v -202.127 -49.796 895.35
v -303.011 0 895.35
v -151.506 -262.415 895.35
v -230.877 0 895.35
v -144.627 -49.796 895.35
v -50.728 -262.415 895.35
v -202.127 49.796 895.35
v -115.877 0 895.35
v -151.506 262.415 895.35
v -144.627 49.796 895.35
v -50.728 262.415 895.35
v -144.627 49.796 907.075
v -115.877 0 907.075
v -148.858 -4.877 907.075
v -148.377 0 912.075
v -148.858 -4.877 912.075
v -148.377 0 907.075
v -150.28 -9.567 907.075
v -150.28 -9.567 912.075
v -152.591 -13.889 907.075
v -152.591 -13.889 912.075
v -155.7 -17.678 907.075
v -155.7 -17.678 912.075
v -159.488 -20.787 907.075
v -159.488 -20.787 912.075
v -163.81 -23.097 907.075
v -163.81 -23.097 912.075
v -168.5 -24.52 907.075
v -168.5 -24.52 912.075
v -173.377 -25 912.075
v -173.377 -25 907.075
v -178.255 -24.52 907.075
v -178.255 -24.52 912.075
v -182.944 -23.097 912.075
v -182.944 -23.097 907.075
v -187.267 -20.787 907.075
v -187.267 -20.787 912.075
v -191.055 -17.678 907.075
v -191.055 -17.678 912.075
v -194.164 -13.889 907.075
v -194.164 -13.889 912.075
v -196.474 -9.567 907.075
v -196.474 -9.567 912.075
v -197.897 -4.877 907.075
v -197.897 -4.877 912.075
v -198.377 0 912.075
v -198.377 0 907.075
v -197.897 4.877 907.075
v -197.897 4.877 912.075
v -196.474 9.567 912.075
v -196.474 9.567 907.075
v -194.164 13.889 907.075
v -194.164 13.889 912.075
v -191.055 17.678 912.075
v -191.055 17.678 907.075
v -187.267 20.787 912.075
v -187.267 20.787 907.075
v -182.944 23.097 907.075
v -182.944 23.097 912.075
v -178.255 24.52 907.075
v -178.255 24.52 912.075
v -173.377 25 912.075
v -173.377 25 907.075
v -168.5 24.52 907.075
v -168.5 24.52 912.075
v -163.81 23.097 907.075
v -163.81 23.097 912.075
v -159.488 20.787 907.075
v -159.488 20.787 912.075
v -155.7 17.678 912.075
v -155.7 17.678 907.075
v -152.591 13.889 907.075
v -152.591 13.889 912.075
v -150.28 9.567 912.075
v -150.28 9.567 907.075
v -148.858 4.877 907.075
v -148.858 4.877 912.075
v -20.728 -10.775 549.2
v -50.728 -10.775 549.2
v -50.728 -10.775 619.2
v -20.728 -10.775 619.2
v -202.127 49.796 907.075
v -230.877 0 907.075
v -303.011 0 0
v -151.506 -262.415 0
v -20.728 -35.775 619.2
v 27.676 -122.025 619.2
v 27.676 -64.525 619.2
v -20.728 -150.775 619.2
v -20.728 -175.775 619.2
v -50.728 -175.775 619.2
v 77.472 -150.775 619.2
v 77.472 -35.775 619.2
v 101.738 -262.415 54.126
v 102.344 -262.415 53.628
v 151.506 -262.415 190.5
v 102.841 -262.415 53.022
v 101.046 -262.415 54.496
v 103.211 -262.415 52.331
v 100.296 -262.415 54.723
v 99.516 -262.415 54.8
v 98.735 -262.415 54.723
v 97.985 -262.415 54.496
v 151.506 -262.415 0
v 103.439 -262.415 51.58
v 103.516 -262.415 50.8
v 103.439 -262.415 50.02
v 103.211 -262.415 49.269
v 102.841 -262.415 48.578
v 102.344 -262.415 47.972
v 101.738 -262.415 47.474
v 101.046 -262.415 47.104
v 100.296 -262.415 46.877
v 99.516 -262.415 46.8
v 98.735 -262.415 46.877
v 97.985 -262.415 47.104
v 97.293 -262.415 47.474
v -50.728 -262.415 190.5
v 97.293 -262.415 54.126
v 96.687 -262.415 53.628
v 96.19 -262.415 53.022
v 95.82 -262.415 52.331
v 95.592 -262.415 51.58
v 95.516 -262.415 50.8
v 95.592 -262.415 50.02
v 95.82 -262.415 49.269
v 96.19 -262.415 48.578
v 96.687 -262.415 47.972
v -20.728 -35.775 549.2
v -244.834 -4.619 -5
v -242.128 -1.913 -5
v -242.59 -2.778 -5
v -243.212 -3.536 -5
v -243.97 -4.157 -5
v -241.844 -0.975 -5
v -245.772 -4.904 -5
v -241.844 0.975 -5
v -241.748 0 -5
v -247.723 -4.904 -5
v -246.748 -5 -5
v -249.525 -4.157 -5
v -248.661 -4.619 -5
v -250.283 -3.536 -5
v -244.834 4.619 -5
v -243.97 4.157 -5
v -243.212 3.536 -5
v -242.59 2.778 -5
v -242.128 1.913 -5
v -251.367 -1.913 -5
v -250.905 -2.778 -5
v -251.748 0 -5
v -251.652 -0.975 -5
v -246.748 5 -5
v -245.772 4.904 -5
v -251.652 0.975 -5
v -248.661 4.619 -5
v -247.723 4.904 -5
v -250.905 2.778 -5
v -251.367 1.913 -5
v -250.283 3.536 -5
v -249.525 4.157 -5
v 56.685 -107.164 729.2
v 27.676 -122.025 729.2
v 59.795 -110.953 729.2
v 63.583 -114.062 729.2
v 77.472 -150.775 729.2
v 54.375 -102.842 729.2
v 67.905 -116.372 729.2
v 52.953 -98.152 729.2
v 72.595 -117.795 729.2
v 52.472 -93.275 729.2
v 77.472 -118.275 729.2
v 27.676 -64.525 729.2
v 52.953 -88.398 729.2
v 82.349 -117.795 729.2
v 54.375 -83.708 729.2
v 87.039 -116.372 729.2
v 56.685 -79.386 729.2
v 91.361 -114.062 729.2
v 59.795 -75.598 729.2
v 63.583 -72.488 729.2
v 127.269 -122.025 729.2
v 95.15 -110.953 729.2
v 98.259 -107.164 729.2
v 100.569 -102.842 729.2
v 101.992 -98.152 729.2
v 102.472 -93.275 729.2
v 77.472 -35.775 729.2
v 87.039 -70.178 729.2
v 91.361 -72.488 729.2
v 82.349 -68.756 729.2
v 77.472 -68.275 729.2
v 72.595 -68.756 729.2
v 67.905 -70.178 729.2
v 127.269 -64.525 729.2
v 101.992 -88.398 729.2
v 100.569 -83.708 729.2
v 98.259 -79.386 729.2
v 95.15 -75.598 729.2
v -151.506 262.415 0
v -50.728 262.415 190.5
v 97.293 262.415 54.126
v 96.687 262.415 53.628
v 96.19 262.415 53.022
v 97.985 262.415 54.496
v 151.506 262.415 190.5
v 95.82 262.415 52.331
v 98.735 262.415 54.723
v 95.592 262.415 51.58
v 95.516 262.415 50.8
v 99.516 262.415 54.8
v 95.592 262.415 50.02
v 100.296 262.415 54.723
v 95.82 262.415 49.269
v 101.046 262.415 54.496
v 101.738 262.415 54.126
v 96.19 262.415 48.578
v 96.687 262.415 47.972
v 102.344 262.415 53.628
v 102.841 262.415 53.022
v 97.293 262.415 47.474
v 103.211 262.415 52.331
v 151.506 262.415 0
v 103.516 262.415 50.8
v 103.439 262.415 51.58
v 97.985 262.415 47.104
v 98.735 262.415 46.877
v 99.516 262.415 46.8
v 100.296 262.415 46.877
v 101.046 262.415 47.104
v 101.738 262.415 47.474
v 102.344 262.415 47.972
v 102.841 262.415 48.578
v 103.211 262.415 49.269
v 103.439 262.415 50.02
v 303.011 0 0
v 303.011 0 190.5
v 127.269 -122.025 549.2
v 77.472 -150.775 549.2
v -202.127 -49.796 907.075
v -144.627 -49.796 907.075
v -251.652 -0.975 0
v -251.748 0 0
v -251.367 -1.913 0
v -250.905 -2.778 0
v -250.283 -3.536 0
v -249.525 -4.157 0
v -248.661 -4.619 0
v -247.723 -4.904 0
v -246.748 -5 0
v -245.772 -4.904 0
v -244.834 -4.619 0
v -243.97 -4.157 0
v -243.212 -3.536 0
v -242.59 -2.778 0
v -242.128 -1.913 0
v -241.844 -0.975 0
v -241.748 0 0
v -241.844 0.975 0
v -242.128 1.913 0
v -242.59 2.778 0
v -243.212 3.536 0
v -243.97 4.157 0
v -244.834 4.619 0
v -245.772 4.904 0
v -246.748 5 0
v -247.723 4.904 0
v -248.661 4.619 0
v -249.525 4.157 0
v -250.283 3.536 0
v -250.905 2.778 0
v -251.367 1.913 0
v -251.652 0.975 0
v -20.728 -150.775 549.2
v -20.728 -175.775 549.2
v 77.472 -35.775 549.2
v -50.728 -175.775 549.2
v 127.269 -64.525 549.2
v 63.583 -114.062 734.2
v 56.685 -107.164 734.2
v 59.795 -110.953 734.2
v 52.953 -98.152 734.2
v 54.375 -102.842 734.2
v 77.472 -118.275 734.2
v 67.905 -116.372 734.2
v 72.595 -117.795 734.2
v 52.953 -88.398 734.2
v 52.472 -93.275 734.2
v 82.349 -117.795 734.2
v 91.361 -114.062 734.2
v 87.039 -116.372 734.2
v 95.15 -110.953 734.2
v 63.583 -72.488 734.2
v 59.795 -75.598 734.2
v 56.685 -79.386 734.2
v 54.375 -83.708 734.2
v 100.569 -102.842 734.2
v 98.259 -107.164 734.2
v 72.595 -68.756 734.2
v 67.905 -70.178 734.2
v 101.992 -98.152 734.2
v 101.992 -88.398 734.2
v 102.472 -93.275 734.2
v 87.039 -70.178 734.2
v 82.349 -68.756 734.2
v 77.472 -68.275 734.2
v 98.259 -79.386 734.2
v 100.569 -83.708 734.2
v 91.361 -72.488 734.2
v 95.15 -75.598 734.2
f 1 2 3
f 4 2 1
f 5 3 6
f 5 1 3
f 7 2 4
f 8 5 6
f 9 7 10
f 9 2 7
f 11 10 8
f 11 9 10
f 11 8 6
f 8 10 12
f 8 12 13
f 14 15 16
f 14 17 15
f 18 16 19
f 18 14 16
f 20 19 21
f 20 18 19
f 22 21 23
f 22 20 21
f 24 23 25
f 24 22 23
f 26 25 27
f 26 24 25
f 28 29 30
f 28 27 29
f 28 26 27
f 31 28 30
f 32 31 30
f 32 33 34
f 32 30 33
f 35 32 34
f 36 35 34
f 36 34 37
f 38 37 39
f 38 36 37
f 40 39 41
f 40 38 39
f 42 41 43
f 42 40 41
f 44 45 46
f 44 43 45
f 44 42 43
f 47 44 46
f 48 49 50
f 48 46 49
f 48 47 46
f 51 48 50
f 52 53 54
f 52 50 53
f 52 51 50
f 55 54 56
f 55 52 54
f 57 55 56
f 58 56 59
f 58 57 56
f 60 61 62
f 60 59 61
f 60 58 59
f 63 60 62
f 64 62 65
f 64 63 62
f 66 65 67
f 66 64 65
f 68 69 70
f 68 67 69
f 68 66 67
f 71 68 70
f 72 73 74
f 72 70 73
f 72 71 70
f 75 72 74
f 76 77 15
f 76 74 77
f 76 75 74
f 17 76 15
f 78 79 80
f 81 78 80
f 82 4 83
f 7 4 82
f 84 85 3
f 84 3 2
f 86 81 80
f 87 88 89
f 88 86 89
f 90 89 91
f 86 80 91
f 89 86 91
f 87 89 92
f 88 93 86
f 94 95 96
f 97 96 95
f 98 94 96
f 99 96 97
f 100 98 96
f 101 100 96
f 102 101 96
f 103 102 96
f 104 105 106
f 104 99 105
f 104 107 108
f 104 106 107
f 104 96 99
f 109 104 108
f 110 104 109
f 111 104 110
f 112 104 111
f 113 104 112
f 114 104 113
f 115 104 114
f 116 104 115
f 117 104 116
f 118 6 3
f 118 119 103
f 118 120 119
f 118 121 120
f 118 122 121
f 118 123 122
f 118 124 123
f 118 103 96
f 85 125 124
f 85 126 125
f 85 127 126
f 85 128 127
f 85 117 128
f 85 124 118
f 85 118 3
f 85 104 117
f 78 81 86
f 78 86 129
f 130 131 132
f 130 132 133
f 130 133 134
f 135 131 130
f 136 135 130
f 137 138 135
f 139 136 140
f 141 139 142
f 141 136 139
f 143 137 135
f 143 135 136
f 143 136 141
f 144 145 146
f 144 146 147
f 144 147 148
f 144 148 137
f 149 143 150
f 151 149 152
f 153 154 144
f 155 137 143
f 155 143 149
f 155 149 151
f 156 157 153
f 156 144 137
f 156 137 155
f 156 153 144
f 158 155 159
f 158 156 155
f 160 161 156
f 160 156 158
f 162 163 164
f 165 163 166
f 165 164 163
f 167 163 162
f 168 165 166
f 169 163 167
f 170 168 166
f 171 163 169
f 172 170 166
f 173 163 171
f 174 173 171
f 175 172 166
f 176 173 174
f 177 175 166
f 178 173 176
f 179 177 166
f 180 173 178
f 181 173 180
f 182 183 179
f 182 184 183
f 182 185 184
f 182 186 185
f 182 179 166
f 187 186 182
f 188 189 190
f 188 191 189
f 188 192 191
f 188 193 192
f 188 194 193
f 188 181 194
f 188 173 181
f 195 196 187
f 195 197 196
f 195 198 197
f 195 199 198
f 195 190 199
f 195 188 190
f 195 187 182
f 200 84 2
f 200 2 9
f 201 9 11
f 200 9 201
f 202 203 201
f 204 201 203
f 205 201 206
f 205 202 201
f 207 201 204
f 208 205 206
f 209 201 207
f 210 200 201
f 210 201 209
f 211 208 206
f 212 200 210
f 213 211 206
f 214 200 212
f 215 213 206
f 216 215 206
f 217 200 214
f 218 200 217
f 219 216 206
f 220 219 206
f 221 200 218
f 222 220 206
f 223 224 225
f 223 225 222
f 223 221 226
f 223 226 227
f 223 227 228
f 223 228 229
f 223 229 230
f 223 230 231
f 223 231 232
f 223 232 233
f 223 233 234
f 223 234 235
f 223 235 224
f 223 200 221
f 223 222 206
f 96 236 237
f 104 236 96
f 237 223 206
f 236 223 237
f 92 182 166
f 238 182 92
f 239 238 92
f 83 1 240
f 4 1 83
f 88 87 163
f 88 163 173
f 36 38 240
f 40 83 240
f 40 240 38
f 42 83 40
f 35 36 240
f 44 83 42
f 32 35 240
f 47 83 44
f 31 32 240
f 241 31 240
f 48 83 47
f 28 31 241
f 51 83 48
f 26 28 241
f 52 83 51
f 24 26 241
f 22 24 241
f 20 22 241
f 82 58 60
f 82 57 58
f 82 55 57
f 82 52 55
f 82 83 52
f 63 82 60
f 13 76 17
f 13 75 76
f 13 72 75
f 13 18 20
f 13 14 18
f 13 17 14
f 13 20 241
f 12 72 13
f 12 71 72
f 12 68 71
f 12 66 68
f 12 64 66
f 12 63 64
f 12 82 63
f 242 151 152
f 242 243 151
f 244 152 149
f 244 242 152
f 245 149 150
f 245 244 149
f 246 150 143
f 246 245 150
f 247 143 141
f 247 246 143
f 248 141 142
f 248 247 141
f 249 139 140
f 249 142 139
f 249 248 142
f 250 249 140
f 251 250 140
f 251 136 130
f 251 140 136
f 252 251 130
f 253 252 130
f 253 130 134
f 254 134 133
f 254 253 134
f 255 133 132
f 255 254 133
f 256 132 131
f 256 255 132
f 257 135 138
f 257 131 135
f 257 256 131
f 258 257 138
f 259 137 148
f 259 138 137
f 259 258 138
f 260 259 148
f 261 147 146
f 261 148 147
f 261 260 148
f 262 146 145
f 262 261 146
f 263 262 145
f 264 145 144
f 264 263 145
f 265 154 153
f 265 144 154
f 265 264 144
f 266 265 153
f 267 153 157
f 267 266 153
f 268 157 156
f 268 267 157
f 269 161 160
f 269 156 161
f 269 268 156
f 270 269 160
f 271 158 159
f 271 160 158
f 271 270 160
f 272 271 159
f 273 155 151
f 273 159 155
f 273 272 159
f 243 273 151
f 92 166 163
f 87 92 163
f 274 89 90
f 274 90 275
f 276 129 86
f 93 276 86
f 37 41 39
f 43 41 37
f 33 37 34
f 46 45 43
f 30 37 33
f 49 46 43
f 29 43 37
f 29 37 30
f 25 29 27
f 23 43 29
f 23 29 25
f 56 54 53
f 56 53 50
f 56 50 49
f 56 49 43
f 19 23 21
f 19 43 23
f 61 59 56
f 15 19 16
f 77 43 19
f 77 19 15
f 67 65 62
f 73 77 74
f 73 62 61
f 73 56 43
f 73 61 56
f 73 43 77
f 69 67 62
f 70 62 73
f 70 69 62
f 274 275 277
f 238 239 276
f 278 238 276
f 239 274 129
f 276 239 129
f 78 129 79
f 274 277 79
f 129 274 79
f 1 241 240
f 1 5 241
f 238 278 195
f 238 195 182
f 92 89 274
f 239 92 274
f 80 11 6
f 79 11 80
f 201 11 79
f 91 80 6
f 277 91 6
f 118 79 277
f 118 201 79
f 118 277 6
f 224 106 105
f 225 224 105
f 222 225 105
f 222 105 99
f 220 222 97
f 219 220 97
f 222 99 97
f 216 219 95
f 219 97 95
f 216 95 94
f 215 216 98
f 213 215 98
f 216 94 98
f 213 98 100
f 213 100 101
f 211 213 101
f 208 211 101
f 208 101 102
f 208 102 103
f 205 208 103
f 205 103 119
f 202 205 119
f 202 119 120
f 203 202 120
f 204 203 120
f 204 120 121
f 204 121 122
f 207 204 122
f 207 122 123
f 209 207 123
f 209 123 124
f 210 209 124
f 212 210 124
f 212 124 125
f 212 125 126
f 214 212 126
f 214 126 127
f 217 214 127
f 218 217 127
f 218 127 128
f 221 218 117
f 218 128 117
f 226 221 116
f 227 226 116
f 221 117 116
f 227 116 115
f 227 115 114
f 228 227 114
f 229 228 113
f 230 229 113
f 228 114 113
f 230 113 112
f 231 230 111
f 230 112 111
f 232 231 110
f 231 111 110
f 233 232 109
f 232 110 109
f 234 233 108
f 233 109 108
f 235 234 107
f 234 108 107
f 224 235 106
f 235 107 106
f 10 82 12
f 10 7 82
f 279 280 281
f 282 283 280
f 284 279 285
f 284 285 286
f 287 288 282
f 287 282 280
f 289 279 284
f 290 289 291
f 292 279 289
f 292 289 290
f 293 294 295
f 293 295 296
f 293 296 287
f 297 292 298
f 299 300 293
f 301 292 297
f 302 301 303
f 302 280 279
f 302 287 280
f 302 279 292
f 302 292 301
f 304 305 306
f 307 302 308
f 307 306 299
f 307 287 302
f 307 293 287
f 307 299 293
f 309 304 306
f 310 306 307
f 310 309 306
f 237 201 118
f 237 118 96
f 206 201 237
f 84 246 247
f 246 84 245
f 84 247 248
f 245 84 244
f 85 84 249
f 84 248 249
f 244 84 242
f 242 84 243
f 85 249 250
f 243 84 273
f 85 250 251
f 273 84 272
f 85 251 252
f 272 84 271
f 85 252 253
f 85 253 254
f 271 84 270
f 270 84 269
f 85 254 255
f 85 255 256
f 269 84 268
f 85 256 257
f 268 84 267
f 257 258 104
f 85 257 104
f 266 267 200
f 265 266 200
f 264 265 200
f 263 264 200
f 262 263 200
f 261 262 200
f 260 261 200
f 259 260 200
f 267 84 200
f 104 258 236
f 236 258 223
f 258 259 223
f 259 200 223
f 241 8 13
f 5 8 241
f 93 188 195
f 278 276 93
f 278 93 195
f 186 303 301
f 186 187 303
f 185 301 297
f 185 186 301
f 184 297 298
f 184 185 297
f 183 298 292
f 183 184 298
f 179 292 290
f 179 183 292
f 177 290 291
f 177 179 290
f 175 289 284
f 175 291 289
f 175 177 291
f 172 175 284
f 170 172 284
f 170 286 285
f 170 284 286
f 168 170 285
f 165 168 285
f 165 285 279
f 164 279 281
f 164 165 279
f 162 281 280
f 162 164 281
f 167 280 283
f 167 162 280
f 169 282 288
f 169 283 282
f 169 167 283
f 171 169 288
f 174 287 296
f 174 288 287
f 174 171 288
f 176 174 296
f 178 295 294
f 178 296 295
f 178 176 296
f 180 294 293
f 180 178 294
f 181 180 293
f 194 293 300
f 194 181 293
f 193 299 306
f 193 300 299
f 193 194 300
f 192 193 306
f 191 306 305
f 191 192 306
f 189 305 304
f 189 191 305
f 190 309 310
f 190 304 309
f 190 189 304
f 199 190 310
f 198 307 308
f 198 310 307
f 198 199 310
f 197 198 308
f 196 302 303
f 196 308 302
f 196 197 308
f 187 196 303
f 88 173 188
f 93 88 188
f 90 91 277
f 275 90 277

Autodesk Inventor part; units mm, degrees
ref_plane "YZ Plane" through (0, 0, 0) normal (1, 0, 0) x (0, 1, 0)
ref_plane "XZ Plane" through (0, 0, 0) normal (0, 1, 0) x (-1, 0, 0)
ref_plane "XY Plane" through (0, 0, 0) normal (0, 0, 1) x (1, 0, 0)
sketch "Sketch1" plane through (0, 0, 0) normal (0, 0, 1) x (1, 0, 0)
  line L0 (303.011, 0) -> (151.5055, -262.4152)
  line L1 (151.5055, -262.4152) -> (-151.5055, -262.4152)
  line L2 (-151.5055, -262.4152) -> (-303.011, 0)
  line L3 (-303.011, 0) -> (-151.5055, 262.4152)
  line L4 (-151.5055, 262.4152) -> (151.5055, 262.4152)
  line L5 (151.5055, 262.4152) -> (303.011, 0)
  point P0 (0, 0)
  point P1 (0, 0)
  dimension "d0" = 606.022
extrude "Extrusion1" add sketch "Sketch1" along normal blind 190.5
sketch "Sketch2" plane through (0, 0, 190.5) normal (0, 0, 1) x (1, 0, 0)
  line L0 (151.5055, -262.4152) -> (303.011, 0) projected
  line L1 (303.011, 0) -> (151.5055, 262.4152) projected
  line L2 (151.5055, 262.4152) -> (-151.5055, 262.4152) construction
  line L3 (-151.5055, 262.4152) -> (-303.011, 0) projected
  line L4 (-303.011, 0) -> (-151.5055, -262.4152) projected
  line L5 (-151.5055, -262.4152) -> (151.5055, -262.4152) construction
  line L6 (151.5055, 262.4152) -> (-151.5055, 262.4152) projected
  line L7 (-50.7278, 262.4152) -> (-50.7278, -262.4152)
  line L8 (-151.5055, -262.4152) -> (151.5055, -262.4152) projected
  line L9 (-50.7278, 262.4152) -> (-151.5055, 262.4152)
  line L10 (-50.7278, -262.4152) -> (-151.5055, -262.4152)
  point P0 (0, 0)
  dimension "d3" = 353.7388
extrude "Extrusion2" add sketch "Sketch2" along normal blind 704.85 contours L8 L4 L3 L6 L7
sketch "Sketch3" plane through (-50.7278, -262.4152, 190.5) normal (1, 0, 0) x (0, 0, -1)
  line L0 (-428.7, 86.64) -> (-358.7, 86.64)
  line L1 (-358.7, 86.64) -> (-358.7, 251.64)
  line L2 (-358.7, 251.64) -> (-428.7, 251.64)
  line L3 (-428.7, 251.64) -> (-428.7, 86.64)
  line L4 (0, 0) -> (-704.85, 0) projected
  line L5 (0, 0) -> (0, 262.4152) projected
  point P0 (190.5, 262.4152)
  dimension "d6" = 86.64
  dimension "d7" = 358.7
  dimension "d8" = 70
  dimension "d9" = 165
extrude "Extrusion3" add sketch "Sketch3" along normal blind 30
sketch "Sketch4" plane through (-20.7278, -262.4152, 190.5) normal (1, 0, 0) x (0, 0, -1)
  line L0 (-428.7, 86.64) -> (-428.7, 251.64) projected
  line L1 (-358.7, 251.64) -> (-358.7, 86.64) projected
  line L2 (-428.7, 111.64) -> (-358.7, 111.64)
  line L3 (-358.7, 111.64) -> (-358.7, 226.64)
  line L4 (-358.7, 226.64) -> (-428.7, 226.64)
  line L5 (-428.7, 226.64) -> (-428.7, 111.64)
  point P0 (190.5, 262.4152)
  point P1 (-428.7, 169.14)
  dimension "d12" = 115
extrude "Extrusion4" add sketch "Sketch4" along normal blind 98.2
sketch "Sketch5" plane through (-50.7278, -175.7752, 619.2) normal (0, 0, 1) x (1, 0, 0)
  line L0 (128.2, 25) -> (128.2, 140) projected
  line L1 (128.2, 140) -> (177.9965, 111.25)
  line L2 (177.9965, 111.25) -> (177.9965, 53.75)
  line L3 (177.9965, 53.75) -> (128.2, 25)
  line L4 (128.2, 25) -> (78.4035, 53.75)
  line L5 (78.4035, 53.75) -> (78.4035, 111.25)
  line L6 (78.4035, 111.25) -> (128.2, 140)
  point P0 (50.7278, 175.7752)
  point P1 (128.2, 82.5)
extrude "Extrusion5" add sketch "Sketch5" along normal blind 110 and the other way blind 70
sketch "Sketch6" plane through (0, 0, 895.35) normal (0, 0, 1) x (1, 0, 0)
  line L0 (-115.8774, 0) -> (-144.6274, -49.7965)
  line L1 (-144.6274, -49.7965) -> (-202.1274, -49.7965)
  line L2 (-202.1274, -49.7965) -> (-230.8774, 0)
  line L3 (-230.8774, 0) -> (-202.1274, 49.7965)
  line L4 (-202.1274, 49.7965) -> (-144.6274, 49.7965)
  line L5 (-144.6274, 49.7965) -> (-115.8774, 0)
  line L6 (-50.7278, -262.4152) -> (-50.7278, 262.4152) projected
  point P0 (0, 0)
  point P1 (-173.3774, 0)
  point P2 (-50.7278, 0)
  dimension "d19" = 115
  dimension "d20" = 122.6496
extrude "Extrusion6" add sketch "Sketch6" along normal blind 11.725
sketch "Sketch7" plane through (-50.7278, -175.7752, 729.2) normal (0, 0, 1) x (1, 0, 0)
  line L0 (177.9965, 111.25) -> (128.2, 140) projected
  line L1 (128.2, 140) -> (78.4035, 111.25) projected
  line L2 (78.4035, 111.25) -> (78.4035, 53.75) projected
  line L3 (78.4035, 53.75) -> (128.2, 25) projected
  line L4 (128.2, 25) -> (177.9965, 53.75) projected
  line L5 (177.9965, 53.75) -> (177.9965, 111.25) projected
  circle A0 centre (128.2, 82.5) radius 25
  point P0 (50.7278, 175.7752)
  point P1 (177.9965, 82.5)
  dimension "d23" = 50
extrude "Extrusion7" add sketch "Sketch7" along normal blind 5 contours A0
sketch "Sketch8" plane through (-151.5055, -262.4152, 0) normal (0, -1, 0) x (1, 0, 0)
  line L0 (303.011, 0) -> (0, 0) projected
  line L1 (303.011, 0) -> (303.011, 190.5) projected
  line L2 (100.7777, 190.5) -> (303.011, 190.5) projected
  line L3 (100.7777, 190.5) -> (100.7777, 895.35) projected
  line L4 (0, 895.35) -> (100.7777, 895.35) projected
  line L5 (0, 0) -> (0, 895.35) projected
  circle A0 centre (251.021, 50.8) radius 4
  point P0 (151.5055, 0)
  dimension "d26" = 8
  dimension "d27" = 50.8
  dimension "d28" = 51.99
extrude "Extrusion8" cut sketch "Sketch8" against normal through all contours A0
sketch "Sketch9" plane through (0, 0, 0) normal (0, 0, -1) x (-1, 0, 0)
  circle A0 centre (246.7476, 0) radius 5
  point P0 (0, 0)
  point P1 (303.011, 0)
  dimension "d31" = 10
  dimension "d32" = 56.2634
extrude "Extrusion9" add sketch "Sketch9" along normal blind 5
sketch "Sketch10" plane through (0, 0, 907.075) normal (0, 0, 1) x (1, 0, 0)
  line L0 (-144.6274, -49.7965) -> (-115.8774, 0) projected
  line L1 (-115.8774, 0) -> (-144.6274, 49.7965) projected
  line L2 (-144.6274, 49.7965) -> (-202.1274, 49.7965) projected
  line L3 (-202.1274, 49.7965) -> (-230.8774, 0) projected
  line L4 (-230.8774, 0) -> (-202.1274, -49.7965) projected
  line L5 (-202.1274, -49.7965) -> (-144.6274, -49.7965) projected
  circle A0 centre (-173.3774, 0) radius 25
  point P0 (0, 0)
  point P1 (-173.3774, 49.7965)
  dimension "d35" = 50
extrude "Extrusion10" add sketch "Sketch10" along normal blind 5 contours A0
properties material "ABS Plastic"
